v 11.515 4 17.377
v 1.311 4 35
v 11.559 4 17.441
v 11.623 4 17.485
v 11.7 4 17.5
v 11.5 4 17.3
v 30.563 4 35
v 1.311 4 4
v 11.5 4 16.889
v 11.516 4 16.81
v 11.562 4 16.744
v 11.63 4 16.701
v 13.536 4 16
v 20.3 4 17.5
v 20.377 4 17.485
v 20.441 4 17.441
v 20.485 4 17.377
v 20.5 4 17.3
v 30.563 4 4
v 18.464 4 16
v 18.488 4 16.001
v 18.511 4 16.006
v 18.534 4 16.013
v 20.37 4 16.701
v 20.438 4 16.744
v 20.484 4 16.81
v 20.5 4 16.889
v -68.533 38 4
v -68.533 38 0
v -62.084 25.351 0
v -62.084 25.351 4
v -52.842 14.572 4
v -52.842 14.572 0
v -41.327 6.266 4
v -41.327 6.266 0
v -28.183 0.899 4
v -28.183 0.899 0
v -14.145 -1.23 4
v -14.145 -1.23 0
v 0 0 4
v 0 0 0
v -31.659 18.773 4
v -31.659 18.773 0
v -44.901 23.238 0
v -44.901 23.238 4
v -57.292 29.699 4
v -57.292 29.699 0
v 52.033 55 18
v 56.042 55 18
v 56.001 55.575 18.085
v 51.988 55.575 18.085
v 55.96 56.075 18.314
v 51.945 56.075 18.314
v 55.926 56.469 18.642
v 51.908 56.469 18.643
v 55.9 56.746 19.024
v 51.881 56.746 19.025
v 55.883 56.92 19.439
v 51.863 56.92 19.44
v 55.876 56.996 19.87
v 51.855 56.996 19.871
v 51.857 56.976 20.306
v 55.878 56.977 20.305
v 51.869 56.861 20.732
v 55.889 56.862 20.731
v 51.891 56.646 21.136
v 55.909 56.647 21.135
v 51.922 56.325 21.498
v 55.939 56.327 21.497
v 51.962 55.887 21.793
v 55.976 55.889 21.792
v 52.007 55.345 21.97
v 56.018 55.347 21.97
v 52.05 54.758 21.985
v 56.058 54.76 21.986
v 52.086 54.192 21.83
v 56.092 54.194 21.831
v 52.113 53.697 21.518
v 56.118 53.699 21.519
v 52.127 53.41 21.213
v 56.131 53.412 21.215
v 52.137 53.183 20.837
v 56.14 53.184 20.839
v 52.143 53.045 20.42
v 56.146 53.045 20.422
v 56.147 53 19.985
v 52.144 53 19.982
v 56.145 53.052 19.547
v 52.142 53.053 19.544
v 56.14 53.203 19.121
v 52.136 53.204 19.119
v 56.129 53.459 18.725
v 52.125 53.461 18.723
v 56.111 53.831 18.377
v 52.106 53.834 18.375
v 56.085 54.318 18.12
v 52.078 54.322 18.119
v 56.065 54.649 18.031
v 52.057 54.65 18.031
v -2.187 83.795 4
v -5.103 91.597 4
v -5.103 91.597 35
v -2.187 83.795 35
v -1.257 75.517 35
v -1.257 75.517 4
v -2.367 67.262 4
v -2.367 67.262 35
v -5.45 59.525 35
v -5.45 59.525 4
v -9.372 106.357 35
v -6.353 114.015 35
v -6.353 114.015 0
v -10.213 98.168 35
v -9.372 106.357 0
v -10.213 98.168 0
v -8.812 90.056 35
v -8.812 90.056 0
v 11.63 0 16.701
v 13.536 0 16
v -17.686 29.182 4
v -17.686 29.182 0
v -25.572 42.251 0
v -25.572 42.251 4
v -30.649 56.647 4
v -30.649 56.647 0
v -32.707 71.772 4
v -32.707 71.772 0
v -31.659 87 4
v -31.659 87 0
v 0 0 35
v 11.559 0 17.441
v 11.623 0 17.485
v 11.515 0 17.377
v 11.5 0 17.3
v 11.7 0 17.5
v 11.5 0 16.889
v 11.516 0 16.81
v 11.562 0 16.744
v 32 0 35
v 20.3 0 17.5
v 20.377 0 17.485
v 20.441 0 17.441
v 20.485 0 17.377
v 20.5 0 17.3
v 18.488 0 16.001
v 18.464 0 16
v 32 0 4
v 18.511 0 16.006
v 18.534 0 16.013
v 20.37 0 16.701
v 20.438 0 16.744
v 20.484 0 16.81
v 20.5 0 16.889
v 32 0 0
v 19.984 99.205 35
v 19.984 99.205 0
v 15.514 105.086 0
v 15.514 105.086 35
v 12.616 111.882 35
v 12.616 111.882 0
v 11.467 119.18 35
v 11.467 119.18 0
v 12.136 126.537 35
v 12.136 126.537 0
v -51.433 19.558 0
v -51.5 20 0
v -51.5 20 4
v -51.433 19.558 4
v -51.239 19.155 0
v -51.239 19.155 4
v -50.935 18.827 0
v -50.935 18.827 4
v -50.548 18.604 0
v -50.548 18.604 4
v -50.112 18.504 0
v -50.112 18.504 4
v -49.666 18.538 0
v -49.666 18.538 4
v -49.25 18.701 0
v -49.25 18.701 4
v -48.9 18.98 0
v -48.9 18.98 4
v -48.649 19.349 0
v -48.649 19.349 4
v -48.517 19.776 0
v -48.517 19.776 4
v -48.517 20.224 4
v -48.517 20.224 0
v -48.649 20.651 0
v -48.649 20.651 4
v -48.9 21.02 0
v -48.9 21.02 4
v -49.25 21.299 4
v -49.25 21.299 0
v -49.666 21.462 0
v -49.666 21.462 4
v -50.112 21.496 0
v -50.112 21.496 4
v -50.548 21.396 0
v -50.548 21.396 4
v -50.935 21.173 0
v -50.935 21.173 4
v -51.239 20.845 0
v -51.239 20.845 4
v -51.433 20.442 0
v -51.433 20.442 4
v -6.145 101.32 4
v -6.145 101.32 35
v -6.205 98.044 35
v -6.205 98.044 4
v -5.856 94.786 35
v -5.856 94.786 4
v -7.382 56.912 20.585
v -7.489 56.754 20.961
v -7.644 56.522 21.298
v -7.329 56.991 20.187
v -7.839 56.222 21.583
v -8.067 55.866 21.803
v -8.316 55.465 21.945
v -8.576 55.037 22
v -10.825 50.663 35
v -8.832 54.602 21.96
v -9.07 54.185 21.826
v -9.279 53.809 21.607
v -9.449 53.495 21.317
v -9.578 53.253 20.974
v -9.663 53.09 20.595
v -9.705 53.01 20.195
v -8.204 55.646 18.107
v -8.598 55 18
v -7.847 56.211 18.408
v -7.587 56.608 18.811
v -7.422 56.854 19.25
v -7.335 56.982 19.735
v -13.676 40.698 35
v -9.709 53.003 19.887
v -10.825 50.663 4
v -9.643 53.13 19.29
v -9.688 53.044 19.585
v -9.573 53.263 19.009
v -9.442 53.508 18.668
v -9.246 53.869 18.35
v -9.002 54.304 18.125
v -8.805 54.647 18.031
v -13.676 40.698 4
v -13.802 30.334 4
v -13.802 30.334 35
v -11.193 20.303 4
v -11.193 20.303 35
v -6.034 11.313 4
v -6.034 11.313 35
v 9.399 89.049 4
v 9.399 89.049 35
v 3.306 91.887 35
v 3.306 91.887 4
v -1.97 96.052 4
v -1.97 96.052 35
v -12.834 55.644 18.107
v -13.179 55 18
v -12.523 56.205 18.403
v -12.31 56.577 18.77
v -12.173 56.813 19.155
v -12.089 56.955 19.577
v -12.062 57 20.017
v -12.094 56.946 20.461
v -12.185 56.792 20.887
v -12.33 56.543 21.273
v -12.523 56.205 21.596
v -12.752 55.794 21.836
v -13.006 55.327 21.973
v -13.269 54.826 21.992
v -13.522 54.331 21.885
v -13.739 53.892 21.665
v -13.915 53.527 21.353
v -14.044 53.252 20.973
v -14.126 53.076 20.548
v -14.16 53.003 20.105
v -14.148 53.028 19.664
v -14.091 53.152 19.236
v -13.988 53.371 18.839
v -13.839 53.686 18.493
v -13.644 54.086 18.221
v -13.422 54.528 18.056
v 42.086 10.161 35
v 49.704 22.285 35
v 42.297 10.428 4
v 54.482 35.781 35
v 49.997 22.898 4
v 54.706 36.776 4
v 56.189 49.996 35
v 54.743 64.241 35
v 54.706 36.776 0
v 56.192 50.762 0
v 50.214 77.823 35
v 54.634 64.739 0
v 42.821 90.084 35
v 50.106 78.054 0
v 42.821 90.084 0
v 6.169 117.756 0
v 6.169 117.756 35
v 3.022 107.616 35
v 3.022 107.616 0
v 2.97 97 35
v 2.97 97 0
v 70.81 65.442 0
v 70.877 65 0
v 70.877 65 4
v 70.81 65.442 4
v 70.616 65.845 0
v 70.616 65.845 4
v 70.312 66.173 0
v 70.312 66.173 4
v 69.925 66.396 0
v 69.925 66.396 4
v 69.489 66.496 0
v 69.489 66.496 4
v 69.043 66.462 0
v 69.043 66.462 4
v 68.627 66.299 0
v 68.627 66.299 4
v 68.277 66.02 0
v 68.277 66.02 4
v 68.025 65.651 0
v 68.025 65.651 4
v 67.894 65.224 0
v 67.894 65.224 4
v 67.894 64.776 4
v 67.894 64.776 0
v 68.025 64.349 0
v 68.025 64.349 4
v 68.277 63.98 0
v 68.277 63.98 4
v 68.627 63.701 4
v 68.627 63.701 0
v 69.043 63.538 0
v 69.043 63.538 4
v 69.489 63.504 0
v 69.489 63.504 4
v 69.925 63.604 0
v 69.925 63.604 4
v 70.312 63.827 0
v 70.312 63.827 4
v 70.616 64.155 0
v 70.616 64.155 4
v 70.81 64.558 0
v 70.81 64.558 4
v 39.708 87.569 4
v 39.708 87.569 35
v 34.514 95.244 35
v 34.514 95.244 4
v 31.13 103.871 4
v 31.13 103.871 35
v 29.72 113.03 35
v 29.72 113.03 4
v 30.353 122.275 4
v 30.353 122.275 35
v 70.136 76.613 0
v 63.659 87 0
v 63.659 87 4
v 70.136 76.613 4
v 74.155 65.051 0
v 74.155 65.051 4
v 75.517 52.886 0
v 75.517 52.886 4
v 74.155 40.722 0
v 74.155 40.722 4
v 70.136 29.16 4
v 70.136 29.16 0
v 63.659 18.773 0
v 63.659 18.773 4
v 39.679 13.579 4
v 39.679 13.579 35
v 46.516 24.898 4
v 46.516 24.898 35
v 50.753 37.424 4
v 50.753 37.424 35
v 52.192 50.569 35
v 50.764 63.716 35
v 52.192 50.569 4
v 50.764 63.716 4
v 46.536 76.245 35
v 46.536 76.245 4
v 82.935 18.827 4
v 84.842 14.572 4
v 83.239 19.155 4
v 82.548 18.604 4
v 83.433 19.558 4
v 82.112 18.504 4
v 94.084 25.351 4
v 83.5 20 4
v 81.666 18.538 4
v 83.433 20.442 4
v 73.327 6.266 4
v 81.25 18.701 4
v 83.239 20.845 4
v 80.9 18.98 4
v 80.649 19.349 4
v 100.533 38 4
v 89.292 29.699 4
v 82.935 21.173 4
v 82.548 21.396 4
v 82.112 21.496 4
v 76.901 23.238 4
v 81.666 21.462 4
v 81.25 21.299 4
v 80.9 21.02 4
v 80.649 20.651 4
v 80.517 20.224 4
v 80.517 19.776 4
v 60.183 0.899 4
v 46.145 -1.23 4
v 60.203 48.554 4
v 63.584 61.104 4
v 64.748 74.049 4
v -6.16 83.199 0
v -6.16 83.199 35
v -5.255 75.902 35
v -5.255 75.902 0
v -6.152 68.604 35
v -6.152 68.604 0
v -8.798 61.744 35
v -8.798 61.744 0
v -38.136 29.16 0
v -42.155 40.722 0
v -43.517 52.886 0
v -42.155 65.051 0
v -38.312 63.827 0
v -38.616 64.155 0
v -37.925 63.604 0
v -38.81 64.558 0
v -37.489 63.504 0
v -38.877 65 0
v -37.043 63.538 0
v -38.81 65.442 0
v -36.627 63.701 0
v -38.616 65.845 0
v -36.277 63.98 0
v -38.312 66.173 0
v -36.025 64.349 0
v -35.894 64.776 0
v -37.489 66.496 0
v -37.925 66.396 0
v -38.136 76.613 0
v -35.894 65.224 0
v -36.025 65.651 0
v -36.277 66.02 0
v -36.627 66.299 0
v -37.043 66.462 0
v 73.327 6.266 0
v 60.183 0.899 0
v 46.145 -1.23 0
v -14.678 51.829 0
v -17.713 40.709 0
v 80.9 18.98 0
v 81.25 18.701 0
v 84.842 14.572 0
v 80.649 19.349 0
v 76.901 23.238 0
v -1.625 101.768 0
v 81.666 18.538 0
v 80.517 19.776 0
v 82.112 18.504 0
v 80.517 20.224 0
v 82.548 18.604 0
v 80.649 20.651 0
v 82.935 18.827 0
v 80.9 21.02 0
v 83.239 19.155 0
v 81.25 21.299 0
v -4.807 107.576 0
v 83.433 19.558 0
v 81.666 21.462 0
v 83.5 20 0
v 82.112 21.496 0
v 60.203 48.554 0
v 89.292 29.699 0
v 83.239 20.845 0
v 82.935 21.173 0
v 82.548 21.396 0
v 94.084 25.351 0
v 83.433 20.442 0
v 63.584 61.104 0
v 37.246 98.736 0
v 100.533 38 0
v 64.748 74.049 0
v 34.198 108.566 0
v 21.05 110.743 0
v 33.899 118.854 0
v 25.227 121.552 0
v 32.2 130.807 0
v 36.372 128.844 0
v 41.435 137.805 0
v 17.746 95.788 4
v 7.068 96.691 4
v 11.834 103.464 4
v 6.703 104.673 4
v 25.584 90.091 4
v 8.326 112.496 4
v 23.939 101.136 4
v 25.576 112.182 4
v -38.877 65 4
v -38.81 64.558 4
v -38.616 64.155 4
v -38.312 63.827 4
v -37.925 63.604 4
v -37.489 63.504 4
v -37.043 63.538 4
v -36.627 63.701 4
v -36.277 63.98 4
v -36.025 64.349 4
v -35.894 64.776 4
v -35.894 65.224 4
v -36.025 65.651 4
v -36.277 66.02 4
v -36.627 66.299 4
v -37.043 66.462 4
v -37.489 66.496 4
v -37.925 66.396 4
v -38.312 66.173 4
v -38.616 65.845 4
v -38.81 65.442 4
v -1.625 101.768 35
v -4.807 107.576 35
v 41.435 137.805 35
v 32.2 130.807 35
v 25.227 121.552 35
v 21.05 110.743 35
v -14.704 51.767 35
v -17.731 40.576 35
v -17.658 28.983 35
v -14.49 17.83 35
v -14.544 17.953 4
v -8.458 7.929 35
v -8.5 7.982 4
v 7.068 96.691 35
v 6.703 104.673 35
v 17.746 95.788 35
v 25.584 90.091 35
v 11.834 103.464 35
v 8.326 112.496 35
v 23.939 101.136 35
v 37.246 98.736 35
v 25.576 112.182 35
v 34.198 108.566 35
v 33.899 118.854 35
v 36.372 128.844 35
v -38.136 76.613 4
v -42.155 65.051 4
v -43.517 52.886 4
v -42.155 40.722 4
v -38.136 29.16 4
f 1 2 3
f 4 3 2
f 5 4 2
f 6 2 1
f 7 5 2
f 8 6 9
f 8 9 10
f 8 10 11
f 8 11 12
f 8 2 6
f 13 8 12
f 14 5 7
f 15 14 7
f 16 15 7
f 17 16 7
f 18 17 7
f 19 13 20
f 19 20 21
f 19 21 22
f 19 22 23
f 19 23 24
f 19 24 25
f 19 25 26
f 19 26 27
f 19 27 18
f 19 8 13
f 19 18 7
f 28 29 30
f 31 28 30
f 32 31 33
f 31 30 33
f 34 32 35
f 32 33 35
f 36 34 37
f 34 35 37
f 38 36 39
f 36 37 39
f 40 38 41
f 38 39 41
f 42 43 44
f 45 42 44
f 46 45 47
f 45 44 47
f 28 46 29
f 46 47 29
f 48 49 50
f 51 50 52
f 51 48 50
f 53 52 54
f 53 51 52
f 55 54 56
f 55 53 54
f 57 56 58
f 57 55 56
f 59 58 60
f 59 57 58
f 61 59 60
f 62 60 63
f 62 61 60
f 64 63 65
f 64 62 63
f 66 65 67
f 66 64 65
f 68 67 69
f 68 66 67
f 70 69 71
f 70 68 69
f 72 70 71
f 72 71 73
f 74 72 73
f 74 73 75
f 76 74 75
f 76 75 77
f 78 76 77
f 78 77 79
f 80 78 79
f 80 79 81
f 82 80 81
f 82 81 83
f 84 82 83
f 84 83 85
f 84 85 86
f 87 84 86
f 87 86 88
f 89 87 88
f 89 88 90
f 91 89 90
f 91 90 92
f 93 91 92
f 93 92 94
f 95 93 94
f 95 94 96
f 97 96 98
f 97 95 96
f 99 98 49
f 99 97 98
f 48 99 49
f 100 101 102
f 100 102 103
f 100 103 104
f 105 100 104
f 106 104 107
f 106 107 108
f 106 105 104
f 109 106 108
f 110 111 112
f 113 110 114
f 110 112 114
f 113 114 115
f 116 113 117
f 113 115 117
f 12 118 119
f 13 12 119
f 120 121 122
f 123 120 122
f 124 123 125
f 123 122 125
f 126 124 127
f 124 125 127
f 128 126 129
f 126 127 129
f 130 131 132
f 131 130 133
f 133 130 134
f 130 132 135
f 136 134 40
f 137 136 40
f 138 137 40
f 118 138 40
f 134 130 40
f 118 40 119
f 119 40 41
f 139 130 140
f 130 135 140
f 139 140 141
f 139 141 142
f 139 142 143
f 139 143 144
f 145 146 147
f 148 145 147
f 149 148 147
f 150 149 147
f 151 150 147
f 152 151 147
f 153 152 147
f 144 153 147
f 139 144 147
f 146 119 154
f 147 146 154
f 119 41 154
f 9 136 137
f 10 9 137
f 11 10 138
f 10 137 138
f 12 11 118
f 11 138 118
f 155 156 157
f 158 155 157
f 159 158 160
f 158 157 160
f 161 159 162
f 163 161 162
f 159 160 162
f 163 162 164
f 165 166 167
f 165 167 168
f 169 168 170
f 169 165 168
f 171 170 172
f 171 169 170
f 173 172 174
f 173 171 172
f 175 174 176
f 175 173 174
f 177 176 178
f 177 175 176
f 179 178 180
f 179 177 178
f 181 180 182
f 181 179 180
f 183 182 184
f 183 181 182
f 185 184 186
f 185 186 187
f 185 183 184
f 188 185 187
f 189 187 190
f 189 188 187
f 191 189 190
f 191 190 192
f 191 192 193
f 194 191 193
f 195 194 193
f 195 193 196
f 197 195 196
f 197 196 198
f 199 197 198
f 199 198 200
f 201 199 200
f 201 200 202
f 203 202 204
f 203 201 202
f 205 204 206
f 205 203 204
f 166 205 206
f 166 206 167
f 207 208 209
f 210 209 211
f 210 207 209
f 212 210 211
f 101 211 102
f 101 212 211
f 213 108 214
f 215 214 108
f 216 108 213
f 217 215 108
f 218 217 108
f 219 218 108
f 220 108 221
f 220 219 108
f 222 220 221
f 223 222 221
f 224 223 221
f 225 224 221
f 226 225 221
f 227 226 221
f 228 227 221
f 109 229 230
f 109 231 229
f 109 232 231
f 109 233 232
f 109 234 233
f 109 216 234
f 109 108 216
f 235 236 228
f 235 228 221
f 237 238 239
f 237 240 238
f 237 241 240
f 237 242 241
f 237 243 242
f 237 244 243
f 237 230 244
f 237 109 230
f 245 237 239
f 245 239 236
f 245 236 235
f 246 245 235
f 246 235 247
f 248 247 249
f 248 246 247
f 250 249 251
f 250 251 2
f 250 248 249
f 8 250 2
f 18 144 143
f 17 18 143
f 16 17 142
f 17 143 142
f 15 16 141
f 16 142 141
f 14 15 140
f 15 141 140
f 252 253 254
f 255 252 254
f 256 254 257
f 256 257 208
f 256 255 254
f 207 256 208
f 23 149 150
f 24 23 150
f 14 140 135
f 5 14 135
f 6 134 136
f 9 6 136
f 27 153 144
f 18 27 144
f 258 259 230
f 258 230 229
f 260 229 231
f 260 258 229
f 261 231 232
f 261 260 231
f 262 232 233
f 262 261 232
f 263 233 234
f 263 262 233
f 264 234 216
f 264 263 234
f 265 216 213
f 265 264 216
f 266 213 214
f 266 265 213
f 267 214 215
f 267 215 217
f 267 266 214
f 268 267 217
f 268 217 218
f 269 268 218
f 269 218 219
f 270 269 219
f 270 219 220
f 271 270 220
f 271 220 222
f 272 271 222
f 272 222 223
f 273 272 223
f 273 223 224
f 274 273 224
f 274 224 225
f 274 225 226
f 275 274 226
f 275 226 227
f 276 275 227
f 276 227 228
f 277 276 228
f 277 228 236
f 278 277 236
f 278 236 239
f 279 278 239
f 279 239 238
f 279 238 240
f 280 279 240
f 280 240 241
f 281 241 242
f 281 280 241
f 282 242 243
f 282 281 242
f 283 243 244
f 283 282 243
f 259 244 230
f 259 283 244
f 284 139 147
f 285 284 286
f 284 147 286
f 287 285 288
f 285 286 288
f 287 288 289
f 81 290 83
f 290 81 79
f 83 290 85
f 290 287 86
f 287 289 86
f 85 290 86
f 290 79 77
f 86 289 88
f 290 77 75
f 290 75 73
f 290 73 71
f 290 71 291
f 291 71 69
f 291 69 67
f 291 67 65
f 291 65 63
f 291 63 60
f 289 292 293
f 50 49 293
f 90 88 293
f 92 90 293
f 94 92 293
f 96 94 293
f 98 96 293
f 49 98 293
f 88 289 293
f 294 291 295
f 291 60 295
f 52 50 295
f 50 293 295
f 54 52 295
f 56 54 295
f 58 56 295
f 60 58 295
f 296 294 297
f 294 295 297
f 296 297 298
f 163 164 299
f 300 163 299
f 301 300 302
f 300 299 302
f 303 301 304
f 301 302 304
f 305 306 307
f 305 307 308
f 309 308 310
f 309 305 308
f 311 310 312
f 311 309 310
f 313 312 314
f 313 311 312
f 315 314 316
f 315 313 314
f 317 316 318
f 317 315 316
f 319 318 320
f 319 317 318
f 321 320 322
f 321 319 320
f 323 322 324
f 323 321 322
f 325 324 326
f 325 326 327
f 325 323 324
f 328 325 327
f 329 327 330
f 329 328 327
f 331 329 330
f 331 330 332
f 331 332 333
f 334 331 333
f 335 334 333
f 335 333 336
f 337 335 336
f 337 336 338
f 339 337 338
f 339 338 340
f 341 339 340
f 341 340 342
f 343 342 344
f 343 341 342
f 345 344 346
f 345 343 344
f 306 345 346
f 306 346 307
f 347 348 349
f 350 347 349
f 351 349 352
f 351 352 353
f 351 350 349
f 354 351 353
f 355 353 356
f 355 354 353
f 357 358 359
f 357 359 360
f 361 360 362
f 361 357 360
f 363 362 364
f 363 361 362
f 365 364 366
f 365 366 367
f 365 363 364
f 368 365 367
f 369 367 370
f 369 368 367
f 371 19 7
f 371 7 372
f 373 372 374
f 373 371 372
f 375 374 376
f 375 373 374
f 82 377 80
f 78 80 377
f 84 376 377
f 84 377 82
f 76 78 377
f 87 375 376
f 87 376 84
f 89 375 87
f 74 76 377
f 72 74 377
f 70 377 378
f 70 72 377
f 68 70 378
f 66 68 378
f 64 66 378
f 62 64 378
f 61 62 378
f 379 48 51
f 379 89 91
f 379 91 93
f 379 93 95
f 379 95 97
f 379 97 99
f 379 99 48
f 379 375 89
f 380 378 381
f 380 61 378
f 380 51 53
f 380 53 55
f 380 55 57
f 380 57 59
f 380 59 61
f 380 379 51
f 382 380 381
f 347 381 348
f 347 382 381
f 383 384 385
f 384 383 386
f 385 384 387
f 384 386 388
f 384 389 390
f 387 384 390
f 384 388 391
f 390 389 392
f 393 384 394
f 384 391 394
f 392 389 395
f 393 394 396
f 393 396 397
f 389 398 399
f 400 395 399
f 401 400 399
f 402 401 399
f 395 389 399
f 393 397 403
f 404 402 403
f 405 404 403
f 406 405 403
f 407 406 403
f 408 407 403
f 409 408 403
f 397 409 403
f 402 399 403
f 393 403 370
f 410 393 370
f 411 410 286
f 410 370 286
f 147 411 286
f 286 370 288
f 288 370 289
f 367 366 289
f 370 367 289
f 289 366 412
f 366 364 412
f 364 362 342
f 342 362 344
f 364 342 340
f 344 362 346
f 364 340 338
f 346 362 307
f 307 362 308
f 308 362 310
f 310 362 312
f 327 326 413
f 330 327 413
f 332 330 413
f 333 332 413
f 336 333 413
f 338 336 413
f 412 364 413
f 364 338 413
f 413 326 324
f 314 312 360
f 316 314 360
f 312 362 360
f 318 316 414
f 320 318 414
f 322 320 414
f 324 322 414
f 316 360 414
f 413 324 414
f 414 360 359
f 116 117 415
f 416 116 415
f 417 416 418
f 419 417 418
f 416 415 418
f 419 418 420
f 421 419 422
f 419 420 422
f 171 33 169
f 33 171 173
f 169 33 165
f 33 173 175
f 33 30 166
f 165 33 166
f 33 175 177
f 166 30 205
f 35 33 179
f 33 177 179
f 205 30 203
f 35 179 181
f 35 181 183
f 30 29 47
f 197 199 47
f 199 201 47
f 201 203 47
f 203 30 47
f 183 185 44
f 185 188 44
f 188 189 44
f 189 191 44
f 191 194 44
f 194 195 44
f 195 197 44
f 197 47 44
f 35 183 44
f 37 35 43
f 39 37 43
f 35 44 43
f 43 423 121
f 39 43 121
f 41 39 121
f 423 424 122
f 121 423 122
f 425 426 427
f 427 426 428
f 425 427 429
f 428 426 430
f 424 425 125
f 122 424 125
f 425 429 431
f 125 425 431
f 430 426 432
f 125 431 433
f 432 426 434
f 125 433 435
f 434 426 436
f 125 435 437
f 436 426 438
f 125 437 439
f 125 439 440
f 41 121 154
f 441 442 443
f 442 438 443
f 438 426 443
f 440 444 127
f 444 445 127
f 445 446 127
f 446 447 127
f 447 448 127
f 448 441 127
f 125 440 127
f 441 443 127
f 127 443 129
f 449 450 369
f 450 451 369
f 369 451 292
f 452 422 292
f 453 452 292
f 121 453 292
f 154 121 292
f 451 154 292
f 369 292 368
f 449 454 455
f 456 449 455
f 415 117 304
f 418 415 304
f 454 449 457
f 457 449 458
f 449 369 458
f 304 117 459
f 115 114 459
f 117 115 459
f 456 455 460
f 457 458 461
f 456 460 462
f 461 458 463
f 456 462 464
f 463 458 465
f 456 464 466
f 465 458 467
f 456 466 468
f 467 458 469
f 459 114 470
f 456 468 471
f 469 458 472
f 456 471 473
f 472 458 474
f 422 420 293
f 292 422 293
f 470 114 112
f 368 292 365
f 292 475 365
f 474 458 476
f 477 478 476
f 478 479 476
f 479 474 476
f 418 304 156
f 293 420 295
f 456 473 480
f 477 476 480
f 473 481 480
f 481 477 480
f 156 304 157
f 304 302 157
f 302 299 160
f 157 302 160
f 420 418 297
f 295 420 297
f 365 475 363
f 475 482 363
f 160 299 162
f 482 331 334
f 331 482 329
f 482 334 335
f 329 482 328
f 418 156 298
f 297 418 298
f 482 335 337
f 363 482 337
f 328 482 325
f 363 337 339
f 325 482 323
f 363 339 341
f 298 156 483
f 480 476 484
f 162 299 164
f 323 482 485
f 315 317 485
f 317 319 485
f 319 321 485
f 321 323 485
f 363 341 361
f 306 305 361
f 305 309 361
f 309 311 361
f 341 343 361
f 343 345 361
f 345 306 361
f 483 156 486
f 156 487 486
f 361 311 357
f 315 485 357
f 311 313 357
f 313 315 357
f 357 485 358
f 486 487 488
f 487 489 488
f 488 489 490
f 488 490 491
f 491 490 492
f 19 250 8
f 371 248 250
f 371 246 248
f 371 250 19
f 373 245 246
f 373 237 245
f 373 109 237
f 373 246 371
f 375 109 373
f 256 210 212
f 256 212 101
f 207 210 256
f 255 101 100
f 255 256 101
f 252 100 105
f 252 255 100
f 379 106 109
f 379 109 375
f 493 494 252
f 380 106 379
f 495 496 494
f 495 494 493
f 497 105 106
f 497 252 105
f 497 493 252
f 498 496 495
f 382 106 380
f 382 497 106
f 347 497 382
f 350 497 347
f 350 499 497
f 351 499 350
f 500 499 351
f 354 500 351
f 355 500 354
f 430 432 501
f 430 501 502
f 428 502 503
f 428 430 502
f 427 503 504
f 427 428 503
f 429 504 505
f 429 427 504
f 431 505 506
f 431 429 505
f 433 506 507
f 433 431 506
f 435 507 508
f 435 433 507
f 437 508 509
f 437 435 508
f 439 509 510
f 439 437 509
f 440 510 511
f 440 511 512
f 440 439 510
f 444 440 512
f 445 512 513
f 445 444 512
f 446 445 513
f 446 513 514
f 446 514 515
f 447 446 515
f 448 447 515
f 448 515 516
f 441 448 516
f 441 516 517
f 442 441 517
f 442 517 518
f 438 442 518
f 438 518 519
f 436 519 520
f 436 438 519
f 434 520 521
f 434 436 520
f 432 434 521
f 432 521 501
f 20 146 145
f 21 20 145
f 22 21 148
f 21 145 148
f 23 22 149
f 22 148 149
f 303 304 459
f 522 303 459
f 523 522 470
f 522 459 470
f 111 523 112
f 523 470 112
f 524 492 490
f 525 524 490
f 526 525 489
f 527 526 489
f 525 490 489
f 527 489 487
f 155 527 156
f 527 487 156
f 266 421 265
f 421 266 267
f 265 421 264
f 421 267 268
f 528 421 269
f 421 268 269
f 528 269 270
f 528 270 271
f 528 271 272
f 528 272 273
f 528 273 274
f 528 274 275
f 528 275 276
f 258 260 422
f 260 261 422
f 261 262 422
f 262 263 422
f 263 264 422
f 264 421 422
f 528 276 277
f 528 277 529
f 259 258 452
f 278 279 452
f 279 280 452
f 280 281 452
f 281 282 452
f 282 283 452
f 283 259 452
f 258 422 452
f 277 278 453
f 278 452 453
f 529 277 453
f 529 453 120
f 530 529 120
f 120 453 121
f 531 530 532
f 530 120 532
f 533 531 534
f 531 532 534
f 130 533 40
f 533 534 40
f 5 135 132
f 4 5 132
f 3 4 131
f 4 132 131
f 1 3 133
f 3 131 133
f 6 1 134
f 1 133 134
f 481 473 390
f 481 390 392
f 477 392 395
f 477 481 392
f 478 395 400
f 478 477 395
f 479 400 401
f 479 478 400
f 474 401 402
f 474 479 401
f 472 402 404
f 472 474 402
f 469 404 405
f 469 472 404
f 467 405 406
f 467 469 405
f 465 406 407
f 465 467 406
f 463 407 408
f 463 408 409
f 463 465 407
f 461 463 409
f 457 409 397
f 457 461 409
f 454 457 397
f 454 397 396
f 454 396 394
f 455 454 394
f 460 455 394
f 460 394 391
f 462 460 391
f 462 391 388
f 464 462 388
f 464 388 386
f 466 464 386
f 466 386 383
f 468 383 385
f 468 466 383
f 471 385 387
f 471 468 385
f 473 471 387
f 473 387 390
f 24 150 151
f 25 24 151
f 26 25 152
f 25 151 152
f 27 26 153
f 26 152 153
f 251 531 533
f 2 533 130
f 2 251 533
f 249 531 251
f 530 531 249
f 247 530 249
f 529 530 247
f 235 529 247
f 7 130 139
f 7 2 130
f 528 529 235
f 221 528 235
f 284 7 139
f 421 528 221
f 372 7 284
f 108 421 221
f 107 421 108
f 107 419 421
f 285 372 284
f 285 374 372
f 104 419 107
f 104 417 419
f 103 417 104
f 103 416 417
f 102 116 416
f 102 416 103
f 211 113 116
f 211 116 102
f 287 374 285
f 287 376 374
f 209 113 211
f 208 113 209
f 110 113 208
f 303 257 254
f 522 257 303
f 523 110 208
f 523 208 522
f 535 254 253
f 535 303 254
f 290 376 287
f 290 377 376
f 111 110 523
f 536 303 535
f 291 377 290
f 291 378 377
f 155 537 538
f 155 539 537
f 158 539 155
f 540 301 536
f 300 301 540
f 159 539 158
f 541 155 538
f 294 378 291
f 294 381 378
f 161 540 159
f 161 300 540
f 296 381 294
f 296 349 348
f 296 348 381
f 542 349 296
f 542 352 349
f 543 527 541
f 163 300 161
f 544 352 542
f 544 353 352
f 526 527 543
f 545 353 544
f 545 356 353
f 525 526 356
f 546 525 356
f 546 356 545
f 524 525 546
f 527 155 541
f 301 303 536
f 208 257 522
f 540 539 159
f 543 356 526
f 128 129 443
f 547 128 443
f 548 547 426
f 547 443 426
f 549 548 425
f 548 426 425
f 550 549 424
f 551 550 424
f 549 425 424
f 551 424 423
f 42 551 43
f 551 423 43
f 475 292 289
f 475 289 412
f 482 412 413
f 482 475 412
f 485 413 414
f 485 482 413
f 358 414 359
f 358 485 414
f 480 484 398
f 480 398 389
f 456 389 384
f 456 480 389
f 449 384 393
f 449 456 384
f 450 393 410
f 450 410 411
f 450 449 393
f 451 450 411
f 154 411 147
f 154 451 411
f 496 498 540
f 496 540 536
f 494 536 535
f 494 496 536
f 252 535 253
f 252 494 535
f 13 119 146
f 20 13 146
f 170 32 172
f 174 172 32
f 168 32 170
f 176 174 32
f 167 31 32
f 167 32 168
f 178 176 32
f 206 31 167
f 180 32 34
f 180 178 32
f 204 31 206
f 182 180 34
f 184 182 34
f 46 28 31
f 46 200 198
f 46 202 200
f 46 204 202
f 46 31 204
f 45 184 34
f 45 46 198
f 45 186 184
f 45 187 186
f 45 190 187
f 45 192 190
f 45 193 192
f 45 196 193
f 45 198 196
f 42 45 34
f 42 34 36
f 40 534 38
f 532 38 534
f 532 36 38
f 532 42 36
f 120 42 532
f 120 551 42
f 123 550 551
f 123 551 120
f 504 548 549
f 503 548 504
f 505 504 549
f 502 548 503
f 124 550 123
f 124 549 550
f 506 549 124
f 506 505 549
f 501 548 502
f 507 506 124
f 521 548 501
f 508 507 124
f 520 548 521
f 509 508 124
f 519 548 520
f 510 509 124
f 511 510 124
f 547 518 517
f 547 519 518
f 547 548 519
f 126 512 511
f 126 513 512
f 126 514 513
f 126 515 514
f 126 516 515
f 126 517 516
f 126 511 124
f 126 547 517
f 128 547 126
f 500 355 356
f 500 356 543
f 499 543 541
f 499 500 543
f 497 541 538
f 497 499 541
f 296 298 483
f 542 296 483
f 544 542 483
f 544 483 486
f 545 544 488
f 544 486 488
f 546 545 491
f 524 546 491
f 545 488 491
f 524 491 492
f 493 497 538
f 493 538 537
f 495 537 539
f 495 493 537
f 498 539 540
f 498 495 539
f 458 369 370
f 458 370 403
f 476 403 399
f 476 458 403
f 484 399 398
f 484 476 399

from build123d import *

# Parameters (mm, degrees)
BOSS_EXTRU_1_DEPTH           = 35
COQUE1_START                 = 4
COQUE1_DEPTH                 = 31
ESQUISSE2_R                  = 1.5
BOSS_EXTRU_2_DEPTH           = 4
ENL_V_MAT_EXTRU_1_DEPTH      = 175.132380731
ENL_V_MAT_EXTRU_1_DEPTH_BACK = 175.132380731
ESQUISSE3_R                  = 2
ENL_V_MAT_EXTRU_3_REACH      = 176.132


# Read off the part's stored shape, not the designer's step: Coque1
with BuildPart() as part:
    # Esquisse1 → Boss.-Extru.1 (new body)
    with BuildSketch(Plane.XY):
        with BuildLine():
            Line((0, 0), (32, 0))
            ThreePointArc((32, 0), (55.728066531, 42.841616018), (42.820629182, 90.083792782))
            ThreePointArc((42.820629182, 90.083792782), (33.698409335, 113.699589876), (41.435424367, 137.804762884))
            ThreePointArc((41.435424367, 137.804762884), (25.22744291, 121.551637289), (19.984387859, 99.204979189))
            ThreePointArc((19.984387859, 99.204979189), (12.61609693, 111.881969553), (12.136039681, 126.536912097))
            ThreePointArc((12.136039681, 126.536912097), (4.219515773, 112.802914106), (2.969732835, 97))
            ThreePointArc((2.969732835, 97), (-3.409170119, 104.566084027), (-6.3525056, 114.014512821))
            ThreePointArc((-6.3525056, 114.014512821), (-10.072723061, 102.291129965), (-8.812437557, 90.056367852))
            ThreePointArc((-8.812437557, 90.056367852), (-5.254890234, 75.901823785), (-8.797583956, 61.743554757))
            ThreePointArc((-8.797583956, 61.743554757), (-17.657714331, 28.982568326), (0, 0))
        make_face()
    extrude(amount=BOSS_EXTRU_1_DEPTH)

    # Coque1 outline → Coque1 (cut)
    with BuildSketch(Plane.XY.offset(COQUE1_START)):
        with BuildLine():
            ThreePointArc((-5.450317373, 59.524921192), (-13.80168075, 30.333767047), (1.311276064, 4))
            Line((1.311276064, 4), (30.562561826, 4))
            ThreePointArc((30.562561826, 4), (51.829960407, 43.957714999), (39.70782155, 87.569353124))
            ThreePointArc((39.70782155, 87.569353124), (31.129906971, 103.87080592), (30.352555686, 122.274982261))
            ThreePointArc((30.352555686, 122.274982261), (24.349701453, 106.719246419), (25.584028276, 90.091209439))
            ThreePointArc((25.584028276, 90.091209439), (14.515213943, 99.414058708), (8.326368872, 112.495815697))
            ThreePointArc((8.326368872, 112.495815697), (6.635364168, 100.670475038), (9.39901844, 89.048926361))
            ThreePointArc((9.39901844, 89.048926361), (0.546946732, 93.816298878), (-6.145312397, 101.319676916))
            ThreePointArc((-6.145312397, 101.319676916), (-6.081248931, 96.409310993), (-5.102512487, 91.597048261))
            ThreePointArc((-5.102512487, 91.597048261), (-1.256885168, 75.517395098), (-5.450317373, 59.524921192))
        make_face()
    extrude(amount=COQUE1_DEPTH, mode=Mode.SUBTRACT)

    # Esquisse2 → Boss.-Extru.2 (add)
    # profile 1 of 2: a face of its own
    with BuildSketch(Plane.XY):
        with BuildLine():
            Line((32, 0), (32, 12.299667719))
            ThreePointArc((32, 12.299667719), (58.802567763, 44.999332283), (63.659481669, 87))
            ThreePointArc((63.659481669, 87), (75.517173587, 52.886347991), (63.659481669, 18.772695982))
            ThreePointArc((63.659481669, 18.772695982), (83.222118055, 26.227396664), (100.533244977, 38))
            ThreePointArc((100.533244977, 38), (73.327044482, 6.266483418), (32, 0))
        make_face()
        with Locations((69.376907093, 65)):
            Circle(ESQUISSE2_R, mode=Mode.SUBTRACT)
        with Locations((82, 20)):
            Circle(ESQUISSE2_R, mode=Mode.SUBTRACT)
    # profile 2 of 2: a face of its own
    with BuildSketch(Plane.XY):
        with BuildLine():
            Line((0, 0), (0, 12.299667719))
            ThreePointArc((0, 12.299667719), (-26.802567763, 44.999332283), (-31.659481669, 87))
            ThreePointArc((-31.659481669, 87), (-43.517173587, 52.886347991), (-31.659481669, 18.772695982))
            ThreePointArc((-31.659481669, 18.772695982), (-51.222118055, 26.227396664), (-68.533244977, 38))
            ThreePointArc((-68.533244977, 38), (-41.327044482, 6.266483418), (0, 0))
        make_face()
        with Locations(Location((-50, 20, 0), (0, 0, 180))):
            Circle(ESQUISSE2_R, mode=Mode.SUBTRACT)
        with Locations(Location((-37.376907093, 65, 0), (0, 0, 180))):
            Circle(ESQUISSE2_R, mode=Mode.SUBTRACT)
    extrude(amount=BOSS_EXTRU_2_DEPTH)

    # Esquisse3 → Enlèv. mat.-Extru.1 (cut, two sides: drawn at the far end of the back side and taken through both)
    with BuildSketch(Plane(origin=(0, 0, 0), x_dir=(0, 0, -1), z_dir=(1, 0, 0)).offset(-ENL_V_MAT_EXTRU_1_DEPTH_BACK)):
        with Locations((-20, 55)):
            Circle(ESQUISSE3_R)
    extrude(amount=ENL_V_MAT_EXTRU_1_DEPTH + ENL_V_MAT_EXTRU_1_DEPTH_BACK, mode=Mode.SUBTRACT)

    # Esquisse4 → Enlèv. mat.-Extru.3 (cut, up to next)
    with BuildSketch(Plane.XZ, mode=Mode.PRIVATE) as enl_v_mat_extru_3_sk1:
        with BuildLine():
            Line((13.536266916, 16), (18.463733084, 16))
            ThreePointArc((18.463733084, 16), (18.499418045, 16.00320929), (18.533957772, 16.012734164))
            Line((18.533957772, 16.012734164), (20.370224688, 16.701334258))
            ThreePointArc((20.370224688, 16.701334258), (20.464385124, 16.774681126), (20.5, 16.888600094))
            Line((20.5, 16.888600094), (20.5, 17.3))
            ThreePointArc((20.5, 17.3), (20.441421356, 17.441421356), (20.3, 17.5))
            Line((20.3, 17.5), (11.7, 17.5))
            ThreePointArc((11.7, 17.5), (11.558578644, 17.441421356), (11.5, 17.3))
            Line((11.5, 17.3), (11.5, 16.888600094))
            ThreePointArc((11.5, 16.888600094), (11.535614876, 16.774681126), (11.629775312, 16.701334258))
            Line((11.629775312, 16.701334258), (13.536266916, 16))
        make_face()
    enl_v_mat_extru_3_tool1 = extrude(enl_v_mat_extru_3_sk1.sketch, amount=-ENL_V_MAT_EXTRU_3_REACH, mode=Mode.PRIVATE) & part.part
    add(enl_v_mat_extru_3_tool1.solids().sort_by_distance((16.003291, 0, 16.812223))[0], mode=Mode.SUBTRACT)


solid = part.part
